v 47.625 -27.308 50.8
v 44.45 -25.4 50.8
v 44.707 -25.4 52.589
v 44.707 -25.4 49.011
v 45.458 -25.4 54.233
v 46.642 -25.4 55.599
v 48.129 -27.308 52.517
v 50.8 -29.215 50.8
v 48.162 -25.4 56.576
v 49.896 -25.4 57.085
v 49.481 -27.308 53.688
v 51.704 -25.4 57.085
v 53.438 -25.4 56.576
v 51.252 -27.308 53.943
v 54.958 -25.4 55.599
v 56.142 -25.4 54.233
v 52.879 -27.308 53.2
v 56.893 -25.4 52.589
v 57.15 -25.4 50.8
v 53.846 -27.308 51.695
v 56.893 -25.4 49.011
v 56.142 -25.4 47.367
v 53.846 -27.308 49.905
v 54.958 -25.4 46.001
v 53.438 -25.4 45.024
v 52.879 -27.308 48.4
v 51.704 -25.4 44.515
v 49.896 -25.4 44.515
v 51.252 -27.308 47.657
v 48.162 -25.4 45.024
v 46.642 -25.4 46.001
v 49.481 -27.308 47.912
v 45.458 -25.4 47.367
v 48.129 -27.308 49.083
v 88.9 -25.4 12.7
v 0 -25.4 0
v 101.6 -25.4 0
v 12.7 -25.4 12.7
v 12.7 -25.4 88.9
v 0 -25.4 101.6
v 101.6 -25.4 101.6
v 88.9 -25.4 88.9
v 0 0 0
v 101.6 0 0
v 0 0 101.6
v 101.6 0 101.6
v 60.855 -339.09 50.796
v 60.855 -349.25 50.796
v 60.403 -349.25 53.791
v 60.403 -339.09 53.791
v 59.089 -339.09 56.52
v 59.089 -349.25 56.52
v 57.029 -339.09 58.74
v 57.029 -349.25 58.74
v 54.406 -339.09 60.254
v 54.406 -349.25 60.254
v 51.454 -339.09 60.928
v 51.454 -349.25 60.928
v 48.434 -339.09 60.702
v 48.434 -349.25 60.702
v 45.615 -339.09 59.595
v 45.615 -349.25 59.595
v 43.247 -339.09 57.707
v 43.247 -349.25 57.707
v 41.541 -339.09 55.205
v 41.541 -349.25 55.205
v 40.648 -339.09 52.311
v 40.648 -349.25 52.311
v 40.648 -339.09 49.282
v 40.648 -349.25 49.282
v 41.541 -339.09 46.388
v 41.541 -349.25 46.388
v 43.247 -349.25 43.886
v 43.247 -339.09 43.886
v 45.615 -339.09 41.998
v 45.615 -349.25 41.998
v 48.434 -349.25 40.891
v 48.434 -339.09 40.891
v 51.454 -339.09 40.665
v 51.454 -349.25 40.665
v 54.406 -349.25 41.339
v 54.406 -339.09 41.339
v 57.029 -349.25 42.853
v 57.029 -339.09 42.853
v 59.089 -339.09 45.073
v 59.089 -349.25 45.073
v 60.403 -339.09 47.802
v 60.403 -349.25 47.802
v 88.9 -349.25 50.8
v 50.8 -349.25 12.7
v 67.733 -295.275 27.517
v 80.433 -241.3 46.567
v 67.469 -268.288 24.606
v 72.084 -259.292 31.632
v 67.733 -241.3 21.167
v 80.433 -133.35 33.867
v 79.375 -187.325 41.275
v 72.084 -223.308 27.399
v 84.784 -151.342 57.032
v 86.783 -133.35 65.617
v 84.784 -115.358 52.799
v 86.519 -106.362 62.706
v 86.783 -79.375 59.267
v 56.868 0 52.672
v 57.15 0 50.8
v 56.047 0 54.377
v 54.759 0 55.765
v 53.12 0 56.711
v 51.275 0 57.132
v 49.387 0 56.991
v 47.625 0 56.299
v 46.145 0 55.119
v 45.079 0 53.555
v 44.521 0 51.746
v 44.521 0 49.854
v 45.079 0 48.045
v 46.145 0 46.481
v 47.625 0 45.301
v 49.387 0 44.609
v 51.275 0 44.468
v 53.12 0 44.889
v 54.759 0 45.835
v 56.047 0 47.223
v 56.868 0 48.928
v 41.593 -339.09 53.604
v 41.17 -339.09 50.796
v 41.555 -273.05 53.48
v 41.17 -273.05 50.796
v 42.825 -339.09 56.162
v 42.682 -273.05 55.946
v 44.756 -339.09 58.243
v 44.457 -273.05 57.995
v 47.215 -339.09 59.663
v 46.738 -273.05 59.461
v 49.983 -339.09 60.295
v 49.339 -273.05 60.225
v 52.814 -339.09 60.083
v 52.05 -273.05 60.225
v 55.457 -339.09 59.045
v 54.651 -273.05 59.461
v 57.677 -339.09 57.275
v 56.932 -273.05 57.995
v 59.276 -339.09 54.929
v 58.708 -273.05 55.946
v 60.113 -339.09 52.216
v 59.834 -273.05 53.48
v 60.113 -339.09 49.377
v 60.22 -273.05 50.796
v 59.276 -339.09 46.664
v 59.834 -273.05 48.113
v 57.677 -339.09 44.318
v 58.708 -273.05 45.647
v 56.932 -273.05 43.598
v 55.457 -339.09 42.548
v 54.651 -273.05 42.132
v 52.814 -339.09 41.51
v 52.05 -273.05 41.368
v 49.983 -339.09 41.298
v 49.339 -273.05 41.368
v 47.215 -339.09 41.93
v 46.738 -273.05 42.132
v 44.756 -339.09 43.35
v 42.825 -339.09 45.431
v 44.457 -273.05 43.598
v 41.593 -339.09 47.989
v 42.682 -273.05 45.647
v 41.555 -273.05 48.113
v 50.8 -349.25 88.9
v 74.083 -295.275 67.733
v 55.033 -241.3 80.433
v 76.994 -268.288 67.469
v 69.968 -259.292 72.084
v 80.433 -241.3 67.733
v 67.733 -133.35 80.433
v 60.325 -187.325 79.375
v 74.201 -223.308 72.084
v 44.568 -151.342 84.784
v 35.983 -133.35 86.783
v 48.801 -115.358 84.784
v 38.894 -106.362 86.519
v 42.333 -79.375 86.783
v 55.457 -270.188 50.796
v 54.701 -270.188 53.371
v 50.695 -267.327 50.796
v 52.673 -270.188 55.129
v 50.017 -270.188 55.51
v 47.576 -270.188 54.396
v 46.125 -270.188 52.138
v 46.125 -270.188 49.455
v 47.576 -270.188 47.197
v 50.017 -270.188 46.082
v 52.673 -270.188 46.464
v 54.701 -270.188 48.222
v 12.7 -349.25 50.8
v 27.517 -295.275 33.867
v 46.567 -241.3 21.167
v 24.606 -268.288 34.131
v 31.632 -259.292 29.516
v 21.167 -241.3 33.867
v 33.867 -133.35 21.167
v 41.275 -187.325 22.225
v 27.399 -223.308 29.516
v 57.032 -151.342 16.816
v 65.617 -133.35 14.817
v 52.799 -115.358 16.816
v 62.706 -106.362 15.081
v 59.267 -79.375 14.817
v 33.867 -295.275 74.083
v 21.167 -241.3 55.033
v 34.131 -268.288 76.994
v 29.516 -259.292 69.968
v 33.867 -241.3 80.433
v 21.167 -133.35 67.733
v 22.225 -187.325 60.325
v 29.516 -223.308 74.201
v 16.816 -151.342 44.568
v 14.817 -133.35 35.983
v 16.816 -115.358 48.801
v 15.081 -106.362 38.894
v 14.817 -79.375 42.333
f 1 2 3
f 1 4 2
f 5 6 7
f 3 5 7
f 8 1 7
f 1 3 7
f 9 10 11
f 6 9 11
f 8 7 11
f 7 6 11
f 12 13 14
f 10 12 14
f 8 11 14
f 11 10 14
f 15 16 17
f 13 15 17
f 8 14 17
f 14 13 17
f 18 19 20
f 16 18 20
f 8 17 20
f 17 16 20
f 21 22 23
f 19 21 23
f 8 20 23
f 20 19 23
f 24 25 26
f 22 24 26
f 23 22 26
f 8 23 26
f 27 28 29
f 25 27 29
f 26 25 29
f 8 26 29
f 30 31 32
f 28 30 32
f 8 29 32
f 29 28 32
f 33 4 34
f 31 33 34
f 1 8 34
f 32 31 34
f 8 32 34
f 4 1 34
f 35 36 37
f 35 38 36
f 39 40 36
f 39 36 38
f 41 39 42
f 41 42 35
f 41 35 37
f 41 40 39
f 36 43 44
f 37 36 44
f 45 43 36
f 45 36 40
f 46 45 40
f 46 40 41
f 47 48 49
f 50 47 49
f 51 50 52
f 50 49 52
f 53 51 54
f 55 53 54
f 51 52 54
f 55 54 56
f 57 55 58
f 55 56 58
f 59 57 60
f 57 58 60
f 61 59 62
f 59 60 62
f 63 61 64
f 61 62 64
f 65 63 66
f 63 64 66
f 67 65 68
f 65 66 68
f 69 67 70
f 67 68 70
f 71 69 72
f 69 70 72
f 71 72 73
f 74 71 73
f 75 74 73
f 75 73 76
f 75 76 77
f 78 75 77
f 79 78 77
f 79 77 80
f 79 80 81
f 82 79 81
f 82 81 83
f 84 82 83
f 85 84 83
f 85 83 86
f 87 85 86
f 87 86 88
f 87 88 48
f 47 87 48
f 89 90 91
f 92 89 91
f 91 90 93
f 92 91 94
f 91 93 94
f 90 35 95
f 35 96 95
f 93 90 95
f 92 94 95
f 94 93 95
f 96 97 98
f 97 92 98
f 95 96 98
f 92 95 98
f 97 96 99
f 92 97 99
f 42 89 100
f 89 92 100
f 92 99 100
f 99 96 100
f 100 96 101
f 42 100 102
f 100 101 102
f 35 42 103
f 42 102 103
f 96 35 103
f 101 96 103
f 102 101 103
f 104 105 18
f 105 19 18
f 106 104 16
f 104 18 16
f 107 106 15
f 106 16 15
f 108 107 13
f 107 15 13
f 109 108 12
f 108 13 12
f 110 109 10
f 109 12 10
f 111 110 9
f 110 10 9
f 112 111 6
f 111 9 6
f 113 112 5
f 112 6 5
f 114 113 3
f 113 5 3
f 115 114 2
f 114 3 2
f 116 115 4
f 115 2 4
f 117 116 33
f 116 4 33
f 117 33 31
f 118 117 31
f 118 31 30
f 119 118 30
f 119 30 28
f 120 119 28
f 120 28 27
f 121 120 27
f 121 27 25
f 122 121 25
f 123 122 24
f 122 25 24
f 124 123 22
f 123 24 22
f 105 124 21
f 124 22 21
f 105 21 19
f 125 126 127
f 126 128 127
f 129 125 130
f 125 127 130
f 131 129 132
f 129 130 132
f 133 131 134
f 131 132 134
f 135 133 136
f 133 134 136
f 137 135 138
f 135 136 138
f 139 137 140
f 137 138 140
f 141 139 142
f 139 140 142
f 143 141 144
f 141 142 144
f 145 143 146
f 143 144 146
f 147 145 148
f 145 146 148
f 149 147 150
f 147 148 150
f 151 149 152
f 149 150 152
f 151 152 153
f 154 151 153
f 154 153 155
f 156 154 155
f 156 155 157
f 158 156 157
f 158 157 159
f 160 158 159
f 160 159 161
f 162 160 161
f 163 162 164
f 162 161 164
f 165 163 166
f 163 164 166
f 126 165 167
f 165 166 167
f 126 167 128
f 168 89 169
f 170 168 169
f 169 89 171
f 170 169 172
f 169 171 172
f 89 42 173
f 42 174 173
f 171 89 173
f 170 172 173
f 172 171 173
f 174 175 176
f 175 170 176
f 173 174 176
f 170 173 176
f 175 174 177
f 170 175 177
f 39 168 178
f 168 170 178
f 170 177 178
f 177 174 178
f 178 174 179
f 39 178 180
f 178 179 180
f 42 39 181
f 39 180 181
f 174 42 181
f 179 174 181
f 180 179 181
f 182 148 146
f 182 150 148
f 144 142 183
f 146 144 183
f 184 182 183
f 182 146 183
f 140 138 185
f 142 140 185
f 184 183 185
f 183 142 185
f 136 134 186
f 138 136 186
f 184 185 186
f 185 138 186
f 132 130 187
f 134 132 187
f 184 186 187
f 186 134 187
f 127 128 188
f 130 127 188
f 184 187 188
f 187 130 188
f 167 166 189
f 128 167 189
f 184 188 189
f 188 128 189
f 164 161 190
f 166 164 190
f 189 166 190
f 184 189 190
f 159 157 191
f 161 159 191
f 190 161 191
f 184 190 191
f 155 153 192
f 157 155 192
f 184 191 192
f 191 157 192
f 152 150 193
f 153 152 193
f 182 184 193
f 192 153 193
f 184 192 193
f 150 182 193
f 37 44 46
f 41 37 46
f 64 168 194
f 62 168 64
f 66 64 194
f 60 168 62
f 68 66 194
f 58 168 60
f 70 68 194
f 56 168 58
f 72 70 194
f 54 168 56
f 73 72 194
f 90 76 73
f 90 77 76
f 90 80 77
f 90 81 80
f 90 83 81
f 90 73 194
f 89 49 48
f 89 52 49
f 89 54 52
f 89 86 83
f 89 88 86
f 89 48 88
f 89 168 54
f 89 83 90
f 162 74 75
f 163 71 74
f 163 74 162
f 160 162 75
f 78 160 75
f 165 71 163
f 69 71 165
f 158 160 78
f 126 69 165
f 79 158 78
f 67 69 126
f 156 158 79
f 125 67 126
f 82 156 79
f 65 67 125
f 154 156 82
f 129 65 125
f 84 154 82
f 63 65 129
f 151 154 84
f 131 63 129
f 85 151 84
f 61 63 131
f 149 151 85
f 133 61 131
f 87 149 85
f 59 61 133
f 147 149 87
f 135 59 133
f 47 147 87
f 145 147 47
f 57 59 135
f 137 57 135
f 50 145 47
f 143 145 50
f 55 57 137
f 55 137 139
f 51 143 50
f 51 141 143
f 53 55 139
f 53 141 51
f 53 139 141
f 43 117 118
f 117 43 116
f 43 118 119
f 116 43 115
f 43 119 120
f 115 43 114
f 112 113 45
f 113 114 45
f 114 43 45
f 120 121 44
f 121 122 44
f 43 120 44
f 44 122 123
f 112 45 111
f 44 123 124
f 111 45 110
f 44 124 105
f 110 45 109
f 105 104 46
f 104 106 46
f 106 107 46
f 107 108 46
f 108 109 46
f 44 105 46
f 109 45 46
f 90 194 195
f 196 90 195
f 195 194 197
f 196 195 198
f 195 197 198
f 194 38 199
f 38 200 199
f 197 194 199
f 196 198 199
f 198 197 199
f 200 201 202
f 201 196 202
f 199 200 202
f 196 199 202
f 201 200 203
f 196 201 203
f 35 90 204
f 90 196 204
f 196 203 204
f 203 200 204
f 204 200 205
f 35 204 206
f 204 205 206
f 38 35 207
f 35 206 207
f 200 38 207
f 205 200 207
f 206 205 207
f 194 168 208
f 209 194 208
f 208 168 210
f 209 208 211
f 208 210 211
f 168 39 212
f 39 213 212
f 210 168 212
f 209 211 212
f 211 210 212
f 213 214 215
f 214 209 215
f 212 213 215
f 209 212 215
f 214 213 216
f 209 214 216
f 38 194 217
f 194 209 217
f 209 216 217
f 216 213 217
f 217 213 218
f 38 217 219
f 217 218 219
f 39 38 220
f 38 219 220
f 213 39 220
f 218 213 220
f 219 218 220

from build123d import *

# Parameters (mm, degrees)
F0_W           = 101.6
F0_H           = 101.6
F1_DEPTH       = 25.4
F2_W           = 76.2
F2_H           = 76.2
F7_D           = 12.7
F7_DEPTH       = 25.4
F7_TIP         = 3.8154649308
F9_D           = 19.05
F9_DEPTH       = 76.2
F9_CBORE_D     = 20.32
F9_CBORE_DEPTH = 10.16
F9_TIP         = 5.7231973962


with BuildPart() as f1:
    # F0 (on Front) → F1 (new body)
    with BuildSketch(Plane.XZ):
        with Locations((50.8, 50.8)):
            Rectangle(F0_W, F0_H)
    extrude(amount=F1_DEPTH)

    # F4 (on offset) → F5 section 0
    with BuildSketch(Plane.XZ.offset(349.25)):
        Polygon((50.8, 88.9), (12.7, 50.8), (50.8, 12.7), (88.9, 50.8), align=None)
    # F2 (on face) → F5 section 1
    with BuildSketch(Plane.XZ.offset(25.4)):
        with Locations((50.8, 50.8)):
            Rectangle(F2_W, F2_H)
    loft()

    # F7
    with Locations(Plane(origin=(0, 0, 0), x_dir=(-1, 0, 0), z_dir=(0, 1, 0))):
        with Locations((-50.8, 50.8)):
            Hole(F7_D / 2, depth=F7_DEPTH)
            with Locations((0, 0, -(F7_DEPTH + F7_TIP / 2))):  # 118° drill point
                Cone(0, F7_D / 2, F7_TIP, mode=Mode.SUBTRACT)

    # F9
    with Locations(Plane.XZ.offset(349.25)):
        with Locations((50.6945904344, 50.7964529097)):
            CounterBoreHole(F9_D / 2, F9_CBORE_D / 2, F9_CBORE_DEPTH, depth=F9_DEPTH)
            with Locations((0, 0, -(F9_DEPTH + F9_TIP / 2))):  # 118° drill point
                Cone(0, F9_D / 2, F9_TIP, mode=Mode.SUBTRACT)


solid = f1.part
